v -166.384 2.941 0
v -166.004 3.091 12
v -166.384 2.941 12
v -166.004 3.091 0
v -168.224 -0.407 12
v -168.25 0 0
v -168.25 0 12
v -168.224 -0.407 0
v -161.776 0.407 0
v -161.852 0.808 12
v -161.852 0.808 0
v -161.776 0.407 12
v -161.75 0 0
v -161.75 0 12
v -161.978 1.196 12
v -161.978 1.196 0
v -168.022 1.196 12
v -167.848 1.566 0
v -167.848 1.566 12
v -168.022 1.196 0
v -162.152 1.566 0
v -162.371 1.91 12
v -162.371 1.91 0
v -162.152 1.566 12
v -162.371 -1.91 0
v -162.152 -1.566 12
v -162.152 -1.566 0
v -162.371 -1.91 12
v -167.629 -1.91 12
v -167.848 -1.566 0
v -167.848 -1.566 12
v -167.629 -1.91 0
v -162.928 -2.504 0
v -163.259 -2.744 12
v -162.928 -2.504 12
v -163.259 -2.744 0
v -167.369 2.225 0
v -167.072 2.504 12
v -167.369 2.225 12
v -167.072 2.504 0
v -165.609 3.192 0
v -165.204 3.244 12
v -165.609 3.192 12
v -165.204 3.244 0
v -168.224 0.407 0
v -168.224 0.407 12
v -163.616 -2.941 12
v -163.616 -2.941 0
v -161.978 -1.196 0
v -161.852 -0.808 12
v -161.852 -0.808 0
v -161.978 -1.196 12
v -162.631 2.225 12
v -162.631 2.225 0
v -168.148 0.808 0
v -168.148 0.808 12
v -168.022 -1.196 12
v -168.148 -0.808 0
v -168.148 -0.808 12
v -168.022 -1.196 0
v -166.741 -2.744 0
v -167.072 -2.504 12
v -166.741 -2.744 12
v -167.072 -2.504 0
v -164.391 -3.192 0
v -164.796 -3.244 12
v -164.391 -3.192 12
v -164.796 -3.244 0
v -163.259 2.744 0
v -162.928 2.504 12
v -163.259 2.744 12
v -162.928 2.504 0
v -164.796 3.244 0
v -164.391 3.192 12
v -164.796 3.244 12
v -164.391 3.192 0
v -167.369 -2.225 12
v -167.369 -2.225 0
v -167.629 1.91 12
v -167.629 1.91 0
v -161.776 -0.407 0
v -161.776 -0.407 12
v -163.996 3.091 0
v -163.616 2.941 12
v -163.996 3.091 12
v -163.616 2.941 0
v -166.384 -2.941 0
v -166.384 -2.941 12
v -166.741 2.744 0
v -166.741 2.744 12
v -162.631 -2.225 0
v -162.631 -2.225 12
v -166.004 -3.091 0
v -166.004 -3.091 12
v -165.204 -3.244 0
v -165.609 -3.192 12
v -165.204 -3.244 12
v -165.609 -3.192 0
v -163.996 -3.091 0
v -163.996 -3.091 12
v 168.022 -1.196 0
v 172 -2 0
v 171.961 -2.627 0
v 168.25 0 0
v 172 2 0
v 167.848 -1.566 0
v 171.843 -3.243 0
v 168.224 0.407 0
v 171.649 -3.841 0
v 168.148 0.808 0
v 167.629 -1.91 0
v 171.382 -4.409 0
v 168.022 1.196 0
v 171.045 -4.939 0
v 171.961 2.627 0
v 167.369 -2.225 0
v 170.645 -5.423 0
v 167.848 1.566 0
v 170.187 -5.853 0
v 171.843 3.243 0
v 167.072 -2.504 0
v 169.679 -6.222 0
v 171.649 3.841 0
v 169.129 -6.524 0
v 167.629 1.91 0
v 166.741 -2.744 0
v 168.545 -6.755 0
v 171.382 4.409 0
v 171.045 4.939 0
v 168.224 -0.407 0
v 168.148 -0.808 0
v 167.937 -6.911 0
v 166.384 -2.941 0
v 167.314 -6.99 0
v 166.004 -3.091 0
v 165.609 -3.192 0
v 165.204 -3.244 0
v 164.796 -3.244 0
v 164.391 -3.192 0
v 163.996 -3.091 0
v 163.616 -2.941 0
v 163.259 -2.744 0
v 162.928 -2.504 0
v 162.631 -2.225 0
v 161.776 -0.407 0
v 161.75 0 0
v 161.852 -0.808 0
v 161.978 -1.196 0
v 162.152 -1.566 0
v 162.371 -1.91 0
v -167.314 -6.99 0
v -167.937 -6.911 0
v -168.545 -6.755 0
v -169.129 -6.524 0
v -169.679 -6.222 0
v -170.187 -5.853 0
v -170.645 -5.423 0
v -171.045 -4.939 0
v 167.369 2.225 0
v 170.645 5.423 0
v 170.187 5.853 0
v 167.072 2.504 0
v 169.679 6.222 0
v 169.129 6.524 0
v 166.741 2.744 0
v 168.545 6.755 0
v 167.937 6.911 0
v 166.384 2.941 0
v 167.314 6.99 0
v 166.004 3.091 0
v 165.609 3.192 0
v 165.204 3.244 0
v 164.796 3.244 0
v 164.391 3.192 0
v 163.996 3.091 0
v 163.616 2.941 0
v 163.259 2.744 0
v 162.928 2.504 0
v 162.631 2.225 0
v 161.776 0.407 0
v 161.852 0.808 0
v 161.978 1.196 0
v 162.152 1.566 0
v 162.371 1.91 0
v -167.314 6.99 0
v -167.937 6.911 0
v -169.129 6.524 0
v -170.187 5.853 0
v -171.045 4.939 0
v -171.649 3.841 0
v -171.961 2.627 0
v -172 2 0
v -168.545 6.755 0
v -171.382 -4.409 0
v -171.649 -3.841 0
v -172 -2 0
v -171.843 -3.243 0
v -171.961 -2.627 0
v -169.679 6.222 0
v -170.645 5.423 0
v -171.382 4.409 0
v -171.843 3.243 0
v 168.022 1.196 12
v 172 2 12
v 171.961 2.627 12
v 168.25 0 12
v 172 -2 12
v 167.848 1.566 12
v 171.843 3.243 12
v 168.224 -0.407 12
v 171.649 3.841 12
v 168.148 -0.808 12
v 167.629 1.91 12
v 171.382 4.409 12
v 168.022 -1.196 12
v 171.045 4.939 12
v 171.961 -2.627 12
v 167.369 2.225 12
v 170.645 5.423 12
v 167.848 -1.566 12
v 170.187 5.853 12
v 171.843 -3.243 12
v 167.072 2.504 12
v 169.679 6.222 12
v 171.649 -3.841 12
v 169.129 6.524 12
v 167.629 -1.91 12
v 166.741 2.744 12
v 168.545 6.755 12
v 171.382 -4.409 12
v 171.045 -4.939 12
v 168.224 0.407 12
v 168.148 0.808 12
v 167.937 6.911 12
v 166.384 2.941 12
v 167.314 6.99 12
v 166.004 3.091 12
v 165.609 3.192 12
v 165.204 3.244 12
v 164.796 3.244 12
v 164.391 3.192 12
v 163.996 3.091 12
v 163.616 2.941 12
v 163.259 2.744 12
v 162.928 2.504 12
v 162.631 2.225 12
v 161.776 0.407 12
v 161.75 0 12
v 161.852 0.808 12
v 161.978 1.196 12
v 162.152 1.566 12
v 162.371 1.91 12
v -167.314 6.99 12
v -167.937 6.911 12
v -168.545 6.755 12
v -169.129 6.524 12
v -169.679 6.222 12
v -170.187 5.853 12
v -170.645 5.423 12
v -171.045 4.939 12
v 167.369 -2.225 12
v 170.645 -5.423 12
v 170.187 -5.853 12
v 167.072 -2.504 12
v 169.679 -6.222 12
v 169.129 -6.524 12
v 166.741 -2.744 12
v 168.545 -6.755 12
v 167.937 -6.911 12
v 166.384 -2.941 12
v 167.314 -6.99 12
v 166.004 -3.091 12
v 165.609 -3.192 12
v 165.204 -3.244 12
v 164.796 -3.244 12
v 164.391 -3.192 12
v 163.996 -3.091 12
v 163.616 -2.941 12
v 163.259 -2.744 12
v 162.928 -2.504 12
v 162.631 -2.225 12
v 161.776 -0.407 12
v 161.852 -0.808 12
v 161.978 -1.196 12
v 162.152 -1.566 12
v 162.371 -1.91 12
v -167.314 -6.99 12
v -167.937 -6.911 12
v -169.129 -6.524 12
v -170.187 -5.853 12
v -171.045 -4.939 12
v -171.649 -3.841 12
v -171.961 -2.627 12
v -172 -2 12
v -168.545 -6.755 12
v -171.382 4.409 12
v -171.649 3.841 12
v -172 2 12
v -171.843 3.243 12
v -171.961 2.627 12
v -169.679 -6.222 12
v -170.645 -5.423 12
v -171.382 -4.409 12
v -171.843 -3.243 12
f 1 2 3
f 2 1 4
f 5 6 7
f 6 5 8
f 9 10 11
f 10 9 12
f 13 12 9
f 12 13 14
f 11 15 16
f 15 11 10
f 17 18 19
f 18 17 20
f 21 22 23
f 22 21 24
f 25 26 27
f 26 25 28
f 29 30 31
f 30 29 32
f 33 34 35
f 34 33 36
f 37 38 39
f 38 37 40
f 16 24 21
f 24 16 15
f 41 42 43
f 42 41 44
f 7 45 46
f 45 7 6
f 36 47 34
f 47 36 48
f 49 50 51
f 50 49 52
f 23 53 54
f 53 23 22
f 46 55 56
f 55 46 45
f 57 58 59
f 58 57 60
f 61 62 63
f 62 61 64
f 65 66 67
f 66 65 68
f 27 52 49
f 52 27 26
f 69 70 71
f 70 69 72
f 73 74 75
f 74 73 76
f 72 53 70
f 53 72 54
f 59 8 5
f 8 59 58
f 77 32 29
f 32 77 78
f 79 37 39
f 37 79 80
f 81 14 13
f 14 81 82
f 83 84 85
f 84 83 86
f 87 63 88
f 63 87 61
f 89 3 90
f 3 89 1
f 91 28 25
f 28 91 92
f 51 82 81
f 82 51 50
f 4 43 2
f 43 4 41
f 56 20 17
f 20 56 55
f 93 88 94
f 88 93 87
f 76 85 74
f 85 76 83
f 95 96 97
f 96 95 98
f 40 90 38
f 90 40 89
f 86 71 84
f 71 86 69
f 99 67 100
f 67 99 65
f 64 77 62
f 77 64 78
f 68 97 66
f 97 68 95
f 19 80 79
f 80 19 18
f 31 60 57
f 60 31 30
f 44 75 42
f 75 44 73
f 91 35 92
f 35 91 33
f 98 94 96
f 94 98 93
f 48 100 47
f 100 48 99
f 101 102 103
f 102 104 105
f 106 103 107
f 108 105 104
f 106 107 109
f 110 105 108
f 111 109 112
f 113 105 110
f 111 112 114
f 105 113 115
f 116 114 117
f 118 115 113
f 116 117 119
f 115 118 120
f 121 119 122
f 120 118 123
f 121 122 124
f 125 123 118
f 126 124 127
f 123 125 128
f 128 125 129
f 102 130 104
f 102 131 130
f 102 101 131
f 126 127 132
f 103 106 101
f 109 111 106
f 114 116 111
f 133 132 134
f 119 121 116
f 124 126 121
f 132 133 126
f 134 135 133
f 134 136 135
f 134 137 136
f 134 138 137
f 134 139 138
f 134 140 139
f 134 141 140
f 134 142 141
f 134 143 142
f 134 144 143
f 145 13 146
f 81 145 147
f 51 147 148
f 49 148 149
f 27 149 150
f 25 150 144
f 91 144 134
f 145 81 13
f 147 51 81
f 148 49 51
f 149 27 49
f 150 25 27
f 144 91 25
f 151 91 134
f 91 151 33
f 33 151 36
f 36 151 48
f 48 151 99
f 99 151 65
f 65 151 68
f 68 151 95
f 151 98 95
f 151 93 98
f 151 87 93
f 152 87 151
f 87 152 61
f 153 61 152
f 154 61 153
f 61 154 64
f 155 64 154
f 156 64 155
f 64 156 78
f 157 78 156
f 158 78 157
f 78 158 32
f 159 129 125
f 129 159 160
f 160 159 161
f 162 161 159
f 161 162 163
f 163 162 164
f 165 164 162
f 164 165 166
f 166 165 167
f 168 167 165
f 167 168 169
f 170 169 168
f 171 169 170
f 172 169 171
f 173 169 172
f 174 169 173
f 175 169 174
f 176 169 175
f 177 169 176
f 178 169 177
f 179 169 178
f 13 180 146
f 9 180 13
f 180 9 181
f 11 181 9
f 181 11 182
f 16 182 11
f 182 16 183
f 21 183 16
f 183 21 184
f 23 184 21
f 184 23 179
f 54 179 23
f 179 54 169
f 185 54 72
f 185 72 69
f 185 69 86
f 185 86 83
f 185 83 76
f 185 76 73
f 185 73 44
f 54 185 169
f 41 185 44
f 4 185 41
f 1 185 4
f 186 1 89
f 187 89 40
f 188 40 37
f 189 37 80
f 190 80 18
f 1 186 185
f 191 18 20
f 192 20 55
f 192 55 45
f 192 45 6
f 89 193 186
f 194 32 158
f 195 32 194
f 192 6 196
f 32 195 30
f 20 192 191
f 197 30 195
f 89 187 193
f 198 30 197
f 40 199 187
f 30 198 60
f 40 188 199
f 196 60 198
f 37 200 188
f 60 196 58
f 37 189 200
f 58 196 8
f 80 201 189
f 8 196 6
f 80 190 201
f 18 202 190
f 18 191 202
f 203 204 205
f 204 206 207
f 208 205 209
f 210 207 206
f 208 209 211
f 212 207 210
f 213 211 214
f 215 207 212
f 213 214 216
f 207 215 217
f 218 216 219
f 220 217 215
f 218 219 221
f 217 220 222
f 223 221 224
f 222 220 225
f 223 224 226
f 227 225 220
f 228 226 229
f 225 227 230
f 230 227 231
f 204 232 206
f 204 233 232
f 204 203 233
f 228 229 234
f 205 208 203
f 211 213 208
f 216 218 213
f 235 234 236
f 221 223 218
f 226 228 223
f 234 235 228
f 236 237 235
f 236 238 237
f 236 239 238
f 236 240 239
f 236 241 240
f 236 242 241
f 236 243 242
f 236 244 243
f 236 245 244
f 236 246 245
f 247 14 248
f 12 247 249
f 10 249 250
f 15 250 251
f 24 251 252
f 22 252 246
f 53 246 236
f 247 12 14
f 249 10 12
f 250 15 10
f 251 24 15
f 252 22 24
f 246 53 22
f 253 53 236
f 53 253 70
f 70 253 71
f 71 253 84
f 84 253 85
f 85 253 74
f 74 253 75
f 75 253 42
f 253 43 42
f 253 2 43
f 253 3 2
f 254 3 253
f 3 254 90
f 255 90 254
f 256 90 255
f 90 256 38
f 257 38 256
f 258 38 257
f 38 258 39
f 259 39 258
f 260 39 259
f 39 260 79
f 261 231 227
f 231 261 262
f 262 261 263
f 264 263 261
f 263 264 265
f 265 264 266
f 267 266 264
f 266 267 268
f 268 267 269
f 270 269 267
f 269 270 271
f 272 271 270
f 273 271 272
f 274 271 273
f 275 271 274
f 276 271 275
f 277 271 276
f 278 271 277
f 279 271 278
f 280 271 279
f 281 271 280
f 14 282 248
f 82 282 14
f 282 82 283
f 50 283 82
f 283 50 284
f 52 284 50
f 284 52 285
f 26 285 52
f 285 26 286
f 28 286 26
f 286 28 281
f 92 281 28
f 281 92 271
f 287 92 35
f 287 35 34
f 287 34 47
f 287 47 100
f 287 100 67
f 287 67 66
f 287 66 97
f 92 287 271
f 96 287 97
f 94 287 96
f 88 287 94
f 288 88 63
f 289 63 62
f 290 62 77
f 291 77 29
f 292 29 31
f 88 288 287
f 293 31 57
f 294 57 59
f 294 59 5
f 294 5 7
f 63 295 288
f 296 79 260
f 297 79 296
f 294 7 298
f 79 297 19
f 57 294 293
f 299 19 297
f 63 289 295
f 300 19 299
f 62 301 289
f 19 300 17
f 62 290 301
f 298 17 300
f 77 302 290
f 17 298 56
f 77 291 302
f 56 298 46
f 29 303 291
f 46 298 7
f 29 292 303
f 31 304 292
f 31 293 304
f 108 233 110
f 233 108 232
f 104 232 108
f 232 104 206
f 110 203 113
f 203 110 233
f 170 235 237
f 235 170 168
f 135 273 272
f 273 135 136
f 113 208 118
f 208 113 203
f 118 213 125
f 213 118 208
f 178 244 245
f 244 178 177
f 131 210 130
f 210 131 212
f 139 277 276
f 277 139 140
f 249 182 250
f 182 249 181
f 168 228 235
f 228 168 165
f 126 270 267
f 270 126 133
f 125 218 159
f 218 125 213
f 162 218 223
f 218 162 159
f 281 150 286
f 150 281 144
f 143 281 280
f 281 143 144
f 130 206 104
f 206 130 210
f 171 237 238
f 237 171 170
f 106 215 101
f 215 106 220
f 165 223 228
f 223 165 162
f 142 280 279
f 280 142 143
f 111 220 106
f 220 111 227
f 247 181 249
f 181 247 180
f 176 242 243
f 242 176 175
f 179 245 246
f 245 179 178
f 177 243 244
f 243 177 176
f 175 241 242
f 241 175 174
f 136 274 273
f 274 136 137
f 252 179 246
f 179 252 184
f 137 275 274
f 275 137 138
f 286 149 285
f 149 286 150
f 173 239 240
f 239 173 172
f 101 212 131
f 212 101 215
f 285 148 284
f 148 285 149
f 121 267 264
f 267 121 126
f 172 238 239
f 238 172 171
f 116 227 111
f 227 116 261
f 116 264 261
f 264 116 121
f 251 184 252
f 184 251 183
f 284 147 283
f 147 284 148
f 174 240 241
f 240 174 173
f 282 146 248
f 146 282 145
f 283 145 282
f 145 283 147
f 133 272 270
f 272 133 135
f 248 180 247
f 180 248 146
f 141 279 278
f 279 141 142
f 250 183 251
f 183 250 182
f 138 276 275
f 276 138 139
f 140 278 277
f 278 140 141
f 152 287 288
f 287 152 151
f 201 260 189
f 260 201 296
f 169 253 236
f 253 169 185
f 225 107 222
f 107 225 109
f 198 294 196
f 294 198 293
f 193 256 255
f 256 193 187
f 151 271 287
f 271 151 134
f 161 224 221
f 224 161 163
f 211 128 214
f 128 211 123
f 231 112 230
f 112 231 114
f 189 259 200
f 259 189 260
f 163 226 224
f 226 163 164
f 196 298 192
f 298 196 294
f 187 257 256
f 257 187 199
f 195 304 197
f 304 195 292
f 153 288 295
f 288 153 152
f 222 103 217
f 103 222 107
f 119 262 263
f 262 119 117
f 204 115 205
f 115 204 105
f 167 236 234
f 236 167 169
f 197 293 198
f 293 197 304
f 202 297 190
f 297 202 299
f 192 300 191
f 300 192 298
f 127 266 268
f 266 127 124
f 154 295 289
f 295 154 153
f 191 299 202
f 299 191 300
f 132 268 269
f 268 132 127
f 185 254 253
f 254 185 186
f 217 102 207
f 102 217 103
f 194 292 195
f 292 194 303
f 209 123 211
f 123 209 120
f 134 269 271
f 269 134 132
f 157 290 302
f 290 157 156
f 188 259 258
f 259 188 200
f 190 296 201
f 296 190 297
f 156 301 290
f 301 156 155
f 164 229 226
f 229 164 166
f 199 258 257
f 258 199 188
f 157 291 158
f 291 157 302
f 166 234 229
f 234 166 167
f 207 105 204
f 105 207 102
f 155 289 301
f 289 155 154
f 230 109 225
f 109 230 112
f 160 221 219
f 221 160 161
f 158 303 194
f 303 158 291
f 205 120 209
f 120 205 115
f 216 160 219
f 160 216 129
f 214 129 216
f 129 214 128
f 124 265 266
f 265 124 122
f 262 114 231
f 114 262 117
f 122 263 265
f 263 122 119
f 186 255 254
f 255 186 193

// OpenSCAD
$fn = 50;


difference() {
	union() {
		hull() {
			translate(v = [-167.0000000000, 2.0000000000, 0]) {
				cylinder(h = 12, r = 5);
			}
			translate(v = [167.0000000000, 2.0000000000, 0]) {
				cylinder(h = 12, r = 5);
			}
			translate(v = [-167.0000000000, -2.0000000000, 0]) {
				cylinder(h = 12, r = 5);
			}
			translate(v = [167.0000000000, -2.0000000000, 0]) {
				cylinder(h = 12, r = 5);
			}
		}
	}
	union() {
		translate(v = [-165.0000000000, 0.0000000000, 0]) {
			cylinder(h = 12, r = 3.2500000000);
		}
		translate(v = [165.0000000000, 0.0000000000, 0]) {
			cylinder(h = 12, r = 3.2500000000);
		}
		translate(v = [-165.0000000000, 0.0000000000, 0]) {
			cylinder(h = 12, r = 1.8000000000);
		}
		translate(v = [165.0000000000, 0.0000000000, 0]) {
			cylinder(h = 12, r = 1.8000000000);
		}
		translate(v = [-165.0000000000, 0.0000000000, 0]) {
			cylinder(h = 12, r = 1.8000000000);
		}
		translate(v = [165.0000000000, 0.0000000000, 0]) {
			cylinder(h = 12, r = 1.8000000000);
		}
		translate(v = [-165.0000000000, 0.0000000000, 0]) {
			cylinder(h = 12, r = 1.8000000000);
		}
		translate(v = [165.0000000000, 0.0000000000, 0]) {
			cylinder(h = 12, r = 1.8000000000);
		}
	}
}
